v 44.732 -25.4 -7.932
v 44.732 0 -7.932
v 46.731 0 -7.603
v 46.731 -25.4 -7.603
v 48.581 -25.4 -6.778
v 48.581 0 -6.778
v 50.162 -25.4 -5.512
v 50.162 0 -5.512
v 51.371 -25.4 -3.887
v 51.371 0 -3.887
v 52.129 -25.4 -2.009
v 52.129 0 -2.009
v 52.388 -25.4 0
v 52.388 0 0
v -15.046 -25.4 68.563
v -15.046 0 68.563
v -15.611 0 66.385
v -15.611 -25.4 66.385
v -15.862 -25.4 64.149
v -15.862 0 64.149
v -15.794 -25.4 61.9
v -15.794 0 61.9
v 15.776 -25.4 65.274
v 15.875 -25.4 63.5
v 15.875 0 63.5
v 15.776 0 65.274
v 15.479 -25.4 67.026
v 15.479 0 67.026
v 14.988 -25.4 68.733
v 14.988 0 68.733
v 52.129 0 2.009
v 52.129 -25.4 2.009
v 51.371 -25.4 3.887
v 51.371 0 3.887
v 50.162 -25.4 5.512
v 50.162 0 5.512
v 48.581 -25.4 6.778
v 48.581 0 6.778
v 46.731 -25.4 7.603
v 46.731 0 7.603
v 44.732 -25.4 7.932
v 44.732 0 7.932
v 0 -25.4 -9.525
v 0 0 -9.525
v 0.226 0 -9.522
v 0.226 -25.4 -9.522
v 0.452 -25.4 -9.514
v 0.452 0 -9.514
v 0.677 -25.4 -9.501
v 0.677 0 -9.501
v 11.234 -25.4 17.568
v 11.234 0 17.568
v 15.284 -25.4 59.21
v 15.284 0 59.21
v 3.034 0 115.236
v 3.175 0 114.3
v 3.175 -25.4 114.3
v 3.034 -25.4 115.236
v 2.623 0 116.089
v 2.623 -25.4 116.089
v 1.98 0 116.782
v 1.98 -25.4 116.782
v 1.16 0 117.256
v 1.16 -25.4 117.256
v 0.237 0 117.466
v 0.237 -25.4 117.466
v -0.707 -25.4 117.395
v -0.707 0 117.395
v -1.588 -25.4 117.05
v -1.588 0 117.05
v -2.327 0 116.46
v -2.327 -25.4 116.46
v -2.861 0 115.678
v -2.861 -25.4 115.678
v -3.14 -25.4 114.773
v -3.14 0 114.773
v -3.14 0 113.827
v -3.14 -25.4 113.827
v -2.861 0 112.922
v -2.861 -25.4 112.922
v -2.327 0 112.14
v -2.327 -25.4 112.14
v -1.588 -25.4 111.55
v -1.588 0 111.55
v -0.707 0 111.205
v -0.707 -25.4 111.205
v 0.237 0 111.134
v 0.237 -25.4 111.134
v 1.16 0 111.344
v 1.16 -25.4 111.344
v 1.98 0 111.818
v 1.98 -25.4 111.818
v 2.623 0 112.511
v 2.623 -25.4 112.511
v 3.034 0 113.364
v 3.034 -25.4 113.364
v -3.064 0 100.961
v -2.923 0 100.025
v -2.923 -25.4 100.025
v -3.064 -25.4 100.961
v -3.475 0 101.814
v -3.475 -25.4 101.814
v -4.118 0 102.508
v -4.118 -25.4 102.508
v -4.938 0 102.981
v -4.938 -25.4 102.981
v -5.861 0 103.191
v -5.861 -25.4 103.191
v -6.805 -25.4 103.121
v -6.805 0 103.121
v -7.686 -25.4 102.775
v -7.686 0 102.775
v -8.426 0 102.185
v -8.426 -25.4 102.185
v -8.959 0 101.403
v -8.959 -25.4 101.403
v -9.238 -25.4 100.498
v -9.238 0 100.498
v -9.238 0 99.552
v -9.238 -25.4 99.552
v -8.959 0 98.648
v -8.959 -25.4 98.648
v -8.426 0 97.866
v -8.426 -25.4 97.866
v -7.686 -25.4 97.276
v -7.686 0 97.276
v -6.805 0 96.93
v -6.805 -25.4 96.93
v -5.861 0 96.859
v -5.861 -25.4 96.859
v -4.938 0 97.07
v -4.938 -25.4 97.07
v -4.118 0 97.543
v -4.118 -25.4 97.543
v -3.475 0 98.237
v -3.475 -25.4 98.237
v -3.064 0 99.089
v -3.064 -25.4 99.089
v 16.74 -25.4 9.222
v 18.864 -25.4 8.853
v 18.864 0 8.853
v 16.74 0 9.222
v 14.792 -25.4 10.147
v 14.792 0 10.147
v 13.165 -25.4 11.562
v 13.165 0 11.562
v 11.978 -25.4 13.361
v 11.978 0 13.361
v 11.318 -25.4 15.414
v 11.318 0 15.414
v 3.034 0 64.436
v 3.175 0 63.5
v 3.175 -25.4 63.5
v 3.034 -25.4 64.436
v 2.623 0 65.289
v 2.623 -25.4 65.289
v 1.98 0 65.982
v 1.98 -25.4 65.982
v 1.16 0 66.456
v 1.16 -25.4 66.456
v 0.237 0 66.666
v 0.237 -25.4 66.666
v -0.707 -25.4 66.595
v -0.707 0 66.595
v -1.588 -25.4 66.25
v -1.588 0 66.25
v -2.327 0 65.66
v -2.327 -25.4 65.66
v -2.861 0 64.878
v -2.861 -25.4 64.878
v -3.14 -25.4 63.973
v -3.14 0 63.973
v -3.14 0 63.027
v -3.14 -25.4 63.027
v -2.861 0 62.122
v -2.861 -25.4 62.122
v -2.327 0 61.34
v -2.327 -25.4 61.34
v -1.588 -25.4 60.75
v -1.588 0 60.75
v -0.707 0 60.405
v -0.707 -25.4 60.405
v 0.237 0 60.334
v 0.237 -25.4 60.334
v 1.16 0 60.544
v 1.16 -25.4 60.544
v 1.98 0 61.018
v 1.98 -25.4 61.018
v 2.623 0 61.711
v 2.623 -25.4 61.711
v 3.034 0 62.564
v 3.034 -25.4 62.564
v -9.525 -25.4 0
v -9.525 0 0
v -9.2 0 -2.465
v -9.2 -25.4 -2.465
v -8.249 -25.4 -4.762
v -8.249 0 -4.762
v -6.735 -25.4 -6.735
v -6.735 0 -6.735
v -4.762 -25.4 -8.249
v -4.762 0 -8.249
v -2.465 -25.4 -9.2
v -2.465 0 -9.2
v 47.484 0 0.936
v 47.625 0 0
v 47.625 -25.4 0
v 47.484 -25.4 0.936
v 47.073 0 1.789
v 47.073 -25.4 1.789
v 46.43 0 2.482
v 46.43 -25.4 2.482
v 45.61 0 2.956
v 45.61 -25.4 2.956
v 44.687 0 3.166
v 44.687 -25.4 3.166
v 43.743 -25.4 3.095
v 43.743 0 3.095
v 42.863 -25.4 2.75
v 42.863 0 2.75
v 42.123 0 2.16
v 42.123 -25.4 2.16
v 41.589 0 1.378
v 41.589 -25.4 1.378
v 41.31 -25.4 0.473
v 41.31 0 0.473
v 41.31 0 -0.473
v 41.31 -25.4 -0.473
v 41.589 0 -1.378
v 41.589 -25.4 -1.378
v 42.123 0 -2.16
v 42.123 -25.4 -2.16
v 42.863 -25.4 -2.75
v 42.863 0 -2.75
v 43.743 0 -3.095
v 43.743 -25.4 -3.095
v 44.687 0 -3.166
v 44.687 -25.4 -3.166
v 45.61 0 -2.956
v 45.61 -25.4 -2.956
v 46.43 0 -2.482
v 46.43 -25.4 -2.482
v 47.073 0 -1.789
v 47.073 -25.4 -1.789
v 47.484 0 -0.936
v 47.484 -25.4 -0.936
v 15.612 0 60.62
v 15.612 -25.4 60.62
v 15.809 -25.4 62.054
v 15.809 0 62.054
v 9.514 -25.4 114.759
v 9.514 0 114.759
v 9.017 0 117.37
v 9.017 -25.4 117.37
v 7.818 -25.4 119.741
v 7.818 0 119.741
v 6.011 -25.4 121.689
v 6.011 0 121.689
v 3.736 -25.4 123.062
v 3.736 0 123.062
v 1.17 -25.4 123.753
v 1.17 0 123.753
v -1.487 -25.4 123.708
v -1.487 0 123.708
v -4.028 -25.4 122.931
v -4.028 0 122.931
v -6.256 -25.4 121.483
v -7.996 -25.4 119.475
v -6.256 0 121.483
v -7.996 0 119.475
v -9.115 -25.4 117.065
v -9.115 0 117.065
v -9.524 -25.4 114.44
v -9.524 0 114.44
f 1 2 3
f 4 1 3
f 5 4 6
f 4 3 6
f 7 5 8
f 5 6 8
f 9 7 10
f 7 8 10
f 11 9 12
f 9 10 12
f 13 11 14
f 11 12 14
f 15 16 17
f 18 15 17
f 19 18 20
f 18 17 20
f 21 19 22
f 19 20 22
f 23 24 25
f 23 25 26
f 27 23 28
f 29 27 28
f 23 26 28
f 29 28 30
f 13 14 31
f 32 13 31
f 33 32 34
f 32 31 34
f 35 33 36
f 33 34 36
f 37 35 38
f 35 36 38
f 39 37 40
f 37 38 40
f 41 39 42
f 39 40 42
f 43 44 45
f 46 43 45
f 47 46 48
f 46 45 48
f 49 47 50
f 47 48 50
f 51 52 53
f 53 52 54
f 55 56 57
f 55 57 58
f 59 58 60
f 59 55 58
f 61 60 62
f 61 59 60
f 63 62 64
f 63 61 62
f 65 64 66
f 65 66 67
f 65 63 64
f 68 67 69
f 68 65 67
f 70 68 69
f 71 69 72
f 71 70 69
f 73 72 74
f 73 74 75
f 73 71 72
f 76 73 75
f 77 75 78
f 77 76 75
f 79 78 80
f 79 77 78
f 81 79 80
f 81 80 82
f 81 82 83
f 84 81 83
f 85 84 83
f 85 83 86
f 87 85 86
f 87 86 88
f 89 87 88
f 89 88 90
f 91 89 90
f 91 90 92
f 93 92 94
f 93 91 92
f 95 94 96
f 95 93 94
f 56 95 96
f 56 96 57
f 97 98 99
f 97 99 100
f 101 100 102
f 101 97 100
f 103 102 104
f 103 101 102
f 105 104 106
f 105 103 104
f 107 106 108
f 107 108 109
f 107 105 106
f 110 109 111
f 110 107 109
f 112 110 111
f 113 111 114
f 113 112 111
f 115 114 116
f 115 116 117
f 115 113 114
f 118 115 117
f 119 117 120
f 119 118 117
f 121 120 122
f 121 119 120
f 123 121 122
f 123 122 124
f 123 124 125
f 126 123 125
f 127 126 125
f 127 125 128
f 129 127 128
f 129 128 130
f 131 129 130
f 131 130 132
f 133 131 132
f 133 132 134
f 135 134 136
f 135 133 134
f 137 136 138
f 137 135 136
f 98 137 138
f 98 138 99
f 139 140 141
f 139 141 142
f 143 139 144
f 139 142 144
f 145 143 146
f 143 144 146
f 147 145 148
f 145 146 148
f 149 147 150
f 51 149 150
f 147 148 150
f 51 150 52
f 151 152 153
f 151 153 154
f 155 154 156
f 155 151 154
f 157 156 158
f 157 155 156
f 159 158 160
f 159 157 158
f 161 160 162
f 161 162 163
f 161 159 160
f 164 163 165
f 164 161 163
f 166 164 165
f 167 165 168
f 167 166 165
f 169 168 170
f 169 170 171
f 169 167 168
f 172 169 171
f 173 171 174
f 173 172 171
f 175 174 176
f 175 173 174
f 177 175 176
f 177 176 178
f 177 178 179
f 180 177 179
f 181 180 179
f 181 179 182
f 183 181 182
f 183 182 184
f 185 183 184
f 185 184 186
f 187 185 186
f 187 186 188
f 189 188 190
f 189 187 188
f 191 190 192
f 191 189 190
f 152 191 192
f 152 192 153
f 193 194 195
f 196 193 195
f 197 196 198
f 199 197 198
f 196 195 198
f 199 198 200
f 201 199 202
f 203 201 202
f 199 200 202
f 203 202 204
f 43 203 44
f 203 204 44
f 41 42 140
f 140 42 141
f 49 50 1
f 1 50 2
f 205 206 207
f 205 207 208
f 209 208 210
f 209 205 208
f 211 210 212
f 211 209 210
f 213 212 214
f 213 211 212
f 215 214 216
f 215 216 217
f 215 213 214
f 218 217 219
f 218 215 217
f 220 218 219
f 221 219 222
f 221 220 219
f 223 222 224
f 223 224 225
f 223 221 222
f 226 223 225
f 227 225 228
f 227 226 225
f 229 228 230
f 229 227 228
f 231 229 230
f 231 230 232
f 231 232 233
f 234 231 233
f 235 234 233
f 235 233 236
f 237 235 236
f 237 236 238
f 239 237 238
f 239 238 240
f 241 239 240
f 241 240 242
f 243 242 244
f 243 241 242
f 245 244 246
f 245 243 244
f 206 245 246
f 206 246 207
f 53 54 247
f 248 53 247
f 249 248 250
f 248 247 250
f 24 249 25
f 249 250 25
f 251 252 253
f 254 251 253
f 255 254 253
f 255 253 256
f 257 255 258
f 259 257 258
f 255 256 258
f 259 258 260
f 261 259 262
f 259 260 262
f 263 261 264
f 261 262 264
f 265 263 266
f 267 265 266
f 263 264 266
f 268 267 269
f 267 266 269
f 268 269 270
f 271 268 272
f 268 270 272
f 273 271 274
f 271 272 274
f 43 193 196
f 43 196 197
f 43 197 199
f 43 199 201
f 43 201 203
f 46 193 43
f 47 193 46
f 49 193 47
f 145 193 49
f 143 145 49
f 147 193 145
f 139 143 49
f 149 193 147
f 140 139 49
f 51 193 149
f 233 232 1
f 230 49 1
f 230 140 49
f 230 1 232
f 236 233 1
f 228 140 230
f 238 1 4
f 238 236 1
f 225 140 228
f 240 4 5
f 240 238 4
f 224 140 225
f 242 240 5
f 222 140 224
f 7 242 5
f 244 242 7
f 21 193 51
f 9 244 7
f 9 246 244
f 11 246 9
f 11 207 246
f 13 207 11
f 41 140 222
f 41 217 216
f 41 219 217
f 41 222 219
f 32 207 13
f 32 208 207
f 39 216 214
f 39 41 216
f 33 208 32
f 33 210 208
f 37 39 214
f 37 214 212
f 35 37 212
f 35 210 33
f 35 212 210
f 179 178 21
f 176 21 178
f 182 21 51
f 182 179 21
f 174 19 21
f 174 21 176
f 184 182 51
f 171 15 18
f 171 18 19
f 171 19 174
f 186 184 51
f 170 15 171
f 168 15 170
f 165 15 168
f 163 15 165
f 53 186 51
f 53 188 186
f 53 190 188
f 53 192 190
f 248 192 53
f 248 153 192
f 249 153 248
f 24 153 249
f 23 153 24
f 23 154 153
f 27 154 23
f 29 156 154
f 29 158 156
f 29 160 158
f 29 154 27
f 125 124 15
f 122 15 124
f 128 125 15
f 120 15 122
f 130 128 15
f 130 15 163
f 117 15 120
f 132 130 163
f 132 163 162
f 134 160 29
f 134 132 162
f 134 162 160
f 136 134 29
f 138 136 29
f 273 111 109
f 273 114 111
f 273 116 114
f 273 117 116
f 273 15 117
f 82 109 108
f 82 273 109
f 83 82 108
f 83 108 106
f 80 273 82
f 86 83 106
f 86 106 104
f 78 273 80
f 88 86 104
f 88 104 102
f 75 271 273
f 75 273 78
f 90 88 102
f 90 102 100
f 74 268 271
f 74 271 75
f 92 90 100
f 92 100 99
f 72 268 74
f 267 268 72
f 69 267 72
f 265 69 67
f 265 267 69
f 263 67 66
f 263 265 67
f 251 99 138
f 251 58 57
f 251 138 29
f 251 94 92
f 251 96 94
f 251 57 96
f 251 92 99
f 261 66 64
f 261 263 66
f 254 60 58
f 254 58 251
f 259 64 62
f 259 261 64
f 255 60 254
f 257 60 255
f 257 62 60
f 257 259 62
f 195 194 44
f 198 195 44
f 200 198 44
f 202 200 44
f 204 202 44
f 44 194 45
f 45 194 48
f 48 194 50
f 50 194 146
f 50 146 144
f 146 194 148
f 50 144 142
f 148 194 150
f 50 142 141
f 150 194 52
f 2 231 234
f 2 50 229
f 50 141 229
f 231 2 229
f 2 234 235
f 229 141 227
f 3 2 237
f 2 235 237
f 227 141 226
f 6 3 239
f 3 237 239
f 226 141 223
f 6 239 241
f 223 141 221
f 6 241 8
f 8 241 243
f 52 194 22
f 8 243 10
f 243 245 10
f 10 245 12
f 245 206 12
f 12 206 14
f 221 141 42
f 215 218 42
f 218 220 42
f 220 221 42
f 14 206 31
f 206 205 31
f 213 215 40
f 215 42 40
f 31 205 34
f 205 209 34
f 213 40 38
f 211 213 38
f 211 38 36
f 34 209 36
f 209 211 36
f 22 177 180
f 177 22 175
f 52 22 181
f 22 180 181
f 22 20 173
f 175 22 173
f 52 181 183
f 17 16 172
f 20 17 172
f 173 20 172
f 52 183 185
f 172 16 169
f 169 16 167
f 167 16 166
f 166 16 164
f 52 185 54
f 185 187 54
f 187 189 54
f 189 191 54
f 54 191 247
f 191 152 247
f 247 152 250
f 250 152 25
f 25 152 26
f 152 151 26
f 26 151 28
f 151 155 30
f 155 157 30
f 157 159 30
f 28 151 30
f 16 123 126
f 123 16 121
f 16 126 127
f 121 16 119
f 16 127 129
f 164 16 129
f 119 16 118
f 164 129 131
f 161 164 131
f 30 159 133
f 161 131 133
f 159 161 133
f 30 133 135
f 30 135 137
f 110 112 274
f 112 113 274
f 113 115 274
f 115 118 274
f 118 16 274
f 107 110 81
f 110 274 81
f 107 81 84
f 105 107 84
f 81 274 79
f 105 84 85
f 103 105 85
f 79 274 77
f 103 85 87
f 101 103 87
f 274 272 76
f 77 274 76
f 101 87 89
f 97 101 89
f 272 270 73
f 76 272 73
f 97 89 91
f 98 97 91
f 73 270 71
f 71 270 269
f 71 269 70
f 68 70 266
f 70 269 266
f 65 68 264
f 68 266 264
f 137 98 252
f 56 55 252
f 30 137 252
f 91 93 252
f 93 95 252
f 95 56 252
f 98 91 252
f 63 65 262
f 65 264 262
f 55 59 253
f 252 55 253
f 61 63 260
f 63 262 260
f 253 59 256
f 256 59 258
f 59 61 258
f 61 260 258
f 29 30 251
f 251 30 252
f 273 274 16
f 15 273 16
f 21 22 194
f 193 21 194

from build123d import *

# Parameters (mm, degrees)
F0_R     = 3.175
F1_DEPTH = 25.4


with BuildPart() as f1:
    # F0 (on Front) → F1 (new body)
    with BuildSketch(Plane.XZ):
        with BuildLine():
            ThreePointArc((-9.5239774035, 114.4395686855), (-0.0697862158, 104.7752556526), (9.525, 114.3))
            ThreePointArc((9.525, 114.3), (9.5222292979, 114.5297263555), (9.5139188035, 114.759319062))
            ThreePointArc((9.5139188035, 114.759319062), (-0.1599542737, 123.8236568413), (-9.5239774035, 114.4395686855))
        make_face()
        with Locations((0, 114.3)):
            Circle(F0_R, mode=Mode.SUBTRACT)
        with BuildLine():
            ThreePointArc((52.3875, 0), (50.1616327839, 5.5119104847), (44.7324052746, 7.9324746146))
            ThreePointArc((44.7324052746, 7.9324746146), (36.5125, 0), (44.7324052746, -7.9324746146))
            ThreePointArc((44.7324052746, -7.9324746146), (50.1616327839, -5.5119104847), (52.3875, 0))
        make_face()
        with Locations((44.45, 0)):
            Circle(F0_R, mode=Mode.SUBTRACT)
        with BuildLine():
            ThreePointArc((15.875, 63.5), (15.651593952, 66.1539087707), (14.9876637149, 68.7331215703))
            ThreePointArc((14.9876637149, 68.7331215703), (-0.0901164538, 79.3747442192), (-15.0461097884, 68.5626282933))
            ThreePointArc((-15.0461097884, 68.5626282933), (-15.7758551867, 65.2714452088), (-15.7942028036, 61.9003804205))
            ThreePointArc((-15.7942028036, 61.9003804205), (-1.3691563451, 47.6841523812), (15.2843424201, 59.2099531722))
            ThreePointArc((15.2843424201, 59.2099531722), (15.7266423772, 61.3347414611), (15.875, 63.5))
        make_face()
        with Locations((0, 63.5)):
            Circle(F0_R, mode=Mode.SUBTRACT)
        with BuildLine():
            ThreePointArc((15.2843424201, 59.2099531722), (-1.3691563451, 47.6841523812), (-15.7942028036, 61.9003804205))
            Line((-15.7942028036, 61.9003804205), (-9.525, 0))
            ThreePointArc((-9.525, 0), (-6.7351920908, 6.7351920908), (0, 9.525))
            ThreePointArc((0, 9.525), (0.3388863295, 9.5189695375), (0.6773435479, 9.500885786))
            ThreePointArc((0.6773435479, 9.500885786), (6.9705567315, 6.4912990883), (9.525, 0))
            ThreePointArc((9.525, 0), (6.9705567315, -6.4912990883), (0.6773435479, -9.500885786))
            Line((0.6773435479, -9.500885786), (44.7324052746, -7.9324746146))
            ThreePointArc((44.7324052746, -7.9324746146), (36.5125, 0), (44.7324052746, 7.9324746146))
            Line((44.7324052746, 7.9324746146), (18.8638606461, 8.8534247346))
            ThreePointArc((18.8638606461, 8.8534247346), (13.1651151548, 11.5615969219), (11.2338630667, 17.5682733858))
            Line((11.2338630667, 17.5682733858), (15.2843424201, 59.2099531722))
        make_face()
        with BuildLine():
            ThreePointArc((0, 9.525), (-6.7351920908, 6.7351920908), (-9.525, 0))
            ThreePointArc((-9.525, 0), (-6.7351920908, -6.7351920908), (0, -9.525))
            Line((0, -9.525), (0.6773435479, -9.500885786))
            ThreePointArc((0.6773435479, -9.500885786), (6.9705567315, -6.4912990883), (9.525, 0))
            ThreePointArc((9.525, 0), (6.9705567315, 6.4912990883), (0.6773435479, 9.500885786))
            Line((0.6773435479, 9.500885786), (0, 9.525))
        make_face()
        with BuildLine():
            Line((0.6773435479, -9.500885786), (0, -9.525))
            ThreePointArc((0, -9.525), (0.3388863295, -9.5189695375), (0.6773435479, -9.500885786))
        make_face()
        with BuildLine():
            ThreePointArc((0.6773435479, 9.500885786), (0.3388863295, 9.5189695375), (0, 9.525))
            Line((0, 9.525), (0.6773435479, 9.500885786))
        make_face()
        with BuildLine():
            ThreePointArc((9.5139188035, 114.759319062), (9.5222292979, 114.5297263555), (9.525, 114.3))
            ThreePointArc((9.525, 114.3), (-0.0697862158, 104.7752556526), (-9.5239774035, 114.4395686855))
            Line((-9.5239774035, 114.4395686855), (-15.0461097884, 68.5626282933))
            ThreePointArc((-15.0461097884, 68.5626282933), (-0.0901164538, 79.3747442192), (14.9876637149, 68.7331215703))
            Line((14.9876637149, 68.7331215703), (9.5139188035, 114.759319062))
        make_face()
        with Locations((-6.0980641283, 100.0252)):
            Circle(F0_R, mode=Mode.SUBTRACT)
    extrude(amount=F1_DEPTH)


solid = f1.part
